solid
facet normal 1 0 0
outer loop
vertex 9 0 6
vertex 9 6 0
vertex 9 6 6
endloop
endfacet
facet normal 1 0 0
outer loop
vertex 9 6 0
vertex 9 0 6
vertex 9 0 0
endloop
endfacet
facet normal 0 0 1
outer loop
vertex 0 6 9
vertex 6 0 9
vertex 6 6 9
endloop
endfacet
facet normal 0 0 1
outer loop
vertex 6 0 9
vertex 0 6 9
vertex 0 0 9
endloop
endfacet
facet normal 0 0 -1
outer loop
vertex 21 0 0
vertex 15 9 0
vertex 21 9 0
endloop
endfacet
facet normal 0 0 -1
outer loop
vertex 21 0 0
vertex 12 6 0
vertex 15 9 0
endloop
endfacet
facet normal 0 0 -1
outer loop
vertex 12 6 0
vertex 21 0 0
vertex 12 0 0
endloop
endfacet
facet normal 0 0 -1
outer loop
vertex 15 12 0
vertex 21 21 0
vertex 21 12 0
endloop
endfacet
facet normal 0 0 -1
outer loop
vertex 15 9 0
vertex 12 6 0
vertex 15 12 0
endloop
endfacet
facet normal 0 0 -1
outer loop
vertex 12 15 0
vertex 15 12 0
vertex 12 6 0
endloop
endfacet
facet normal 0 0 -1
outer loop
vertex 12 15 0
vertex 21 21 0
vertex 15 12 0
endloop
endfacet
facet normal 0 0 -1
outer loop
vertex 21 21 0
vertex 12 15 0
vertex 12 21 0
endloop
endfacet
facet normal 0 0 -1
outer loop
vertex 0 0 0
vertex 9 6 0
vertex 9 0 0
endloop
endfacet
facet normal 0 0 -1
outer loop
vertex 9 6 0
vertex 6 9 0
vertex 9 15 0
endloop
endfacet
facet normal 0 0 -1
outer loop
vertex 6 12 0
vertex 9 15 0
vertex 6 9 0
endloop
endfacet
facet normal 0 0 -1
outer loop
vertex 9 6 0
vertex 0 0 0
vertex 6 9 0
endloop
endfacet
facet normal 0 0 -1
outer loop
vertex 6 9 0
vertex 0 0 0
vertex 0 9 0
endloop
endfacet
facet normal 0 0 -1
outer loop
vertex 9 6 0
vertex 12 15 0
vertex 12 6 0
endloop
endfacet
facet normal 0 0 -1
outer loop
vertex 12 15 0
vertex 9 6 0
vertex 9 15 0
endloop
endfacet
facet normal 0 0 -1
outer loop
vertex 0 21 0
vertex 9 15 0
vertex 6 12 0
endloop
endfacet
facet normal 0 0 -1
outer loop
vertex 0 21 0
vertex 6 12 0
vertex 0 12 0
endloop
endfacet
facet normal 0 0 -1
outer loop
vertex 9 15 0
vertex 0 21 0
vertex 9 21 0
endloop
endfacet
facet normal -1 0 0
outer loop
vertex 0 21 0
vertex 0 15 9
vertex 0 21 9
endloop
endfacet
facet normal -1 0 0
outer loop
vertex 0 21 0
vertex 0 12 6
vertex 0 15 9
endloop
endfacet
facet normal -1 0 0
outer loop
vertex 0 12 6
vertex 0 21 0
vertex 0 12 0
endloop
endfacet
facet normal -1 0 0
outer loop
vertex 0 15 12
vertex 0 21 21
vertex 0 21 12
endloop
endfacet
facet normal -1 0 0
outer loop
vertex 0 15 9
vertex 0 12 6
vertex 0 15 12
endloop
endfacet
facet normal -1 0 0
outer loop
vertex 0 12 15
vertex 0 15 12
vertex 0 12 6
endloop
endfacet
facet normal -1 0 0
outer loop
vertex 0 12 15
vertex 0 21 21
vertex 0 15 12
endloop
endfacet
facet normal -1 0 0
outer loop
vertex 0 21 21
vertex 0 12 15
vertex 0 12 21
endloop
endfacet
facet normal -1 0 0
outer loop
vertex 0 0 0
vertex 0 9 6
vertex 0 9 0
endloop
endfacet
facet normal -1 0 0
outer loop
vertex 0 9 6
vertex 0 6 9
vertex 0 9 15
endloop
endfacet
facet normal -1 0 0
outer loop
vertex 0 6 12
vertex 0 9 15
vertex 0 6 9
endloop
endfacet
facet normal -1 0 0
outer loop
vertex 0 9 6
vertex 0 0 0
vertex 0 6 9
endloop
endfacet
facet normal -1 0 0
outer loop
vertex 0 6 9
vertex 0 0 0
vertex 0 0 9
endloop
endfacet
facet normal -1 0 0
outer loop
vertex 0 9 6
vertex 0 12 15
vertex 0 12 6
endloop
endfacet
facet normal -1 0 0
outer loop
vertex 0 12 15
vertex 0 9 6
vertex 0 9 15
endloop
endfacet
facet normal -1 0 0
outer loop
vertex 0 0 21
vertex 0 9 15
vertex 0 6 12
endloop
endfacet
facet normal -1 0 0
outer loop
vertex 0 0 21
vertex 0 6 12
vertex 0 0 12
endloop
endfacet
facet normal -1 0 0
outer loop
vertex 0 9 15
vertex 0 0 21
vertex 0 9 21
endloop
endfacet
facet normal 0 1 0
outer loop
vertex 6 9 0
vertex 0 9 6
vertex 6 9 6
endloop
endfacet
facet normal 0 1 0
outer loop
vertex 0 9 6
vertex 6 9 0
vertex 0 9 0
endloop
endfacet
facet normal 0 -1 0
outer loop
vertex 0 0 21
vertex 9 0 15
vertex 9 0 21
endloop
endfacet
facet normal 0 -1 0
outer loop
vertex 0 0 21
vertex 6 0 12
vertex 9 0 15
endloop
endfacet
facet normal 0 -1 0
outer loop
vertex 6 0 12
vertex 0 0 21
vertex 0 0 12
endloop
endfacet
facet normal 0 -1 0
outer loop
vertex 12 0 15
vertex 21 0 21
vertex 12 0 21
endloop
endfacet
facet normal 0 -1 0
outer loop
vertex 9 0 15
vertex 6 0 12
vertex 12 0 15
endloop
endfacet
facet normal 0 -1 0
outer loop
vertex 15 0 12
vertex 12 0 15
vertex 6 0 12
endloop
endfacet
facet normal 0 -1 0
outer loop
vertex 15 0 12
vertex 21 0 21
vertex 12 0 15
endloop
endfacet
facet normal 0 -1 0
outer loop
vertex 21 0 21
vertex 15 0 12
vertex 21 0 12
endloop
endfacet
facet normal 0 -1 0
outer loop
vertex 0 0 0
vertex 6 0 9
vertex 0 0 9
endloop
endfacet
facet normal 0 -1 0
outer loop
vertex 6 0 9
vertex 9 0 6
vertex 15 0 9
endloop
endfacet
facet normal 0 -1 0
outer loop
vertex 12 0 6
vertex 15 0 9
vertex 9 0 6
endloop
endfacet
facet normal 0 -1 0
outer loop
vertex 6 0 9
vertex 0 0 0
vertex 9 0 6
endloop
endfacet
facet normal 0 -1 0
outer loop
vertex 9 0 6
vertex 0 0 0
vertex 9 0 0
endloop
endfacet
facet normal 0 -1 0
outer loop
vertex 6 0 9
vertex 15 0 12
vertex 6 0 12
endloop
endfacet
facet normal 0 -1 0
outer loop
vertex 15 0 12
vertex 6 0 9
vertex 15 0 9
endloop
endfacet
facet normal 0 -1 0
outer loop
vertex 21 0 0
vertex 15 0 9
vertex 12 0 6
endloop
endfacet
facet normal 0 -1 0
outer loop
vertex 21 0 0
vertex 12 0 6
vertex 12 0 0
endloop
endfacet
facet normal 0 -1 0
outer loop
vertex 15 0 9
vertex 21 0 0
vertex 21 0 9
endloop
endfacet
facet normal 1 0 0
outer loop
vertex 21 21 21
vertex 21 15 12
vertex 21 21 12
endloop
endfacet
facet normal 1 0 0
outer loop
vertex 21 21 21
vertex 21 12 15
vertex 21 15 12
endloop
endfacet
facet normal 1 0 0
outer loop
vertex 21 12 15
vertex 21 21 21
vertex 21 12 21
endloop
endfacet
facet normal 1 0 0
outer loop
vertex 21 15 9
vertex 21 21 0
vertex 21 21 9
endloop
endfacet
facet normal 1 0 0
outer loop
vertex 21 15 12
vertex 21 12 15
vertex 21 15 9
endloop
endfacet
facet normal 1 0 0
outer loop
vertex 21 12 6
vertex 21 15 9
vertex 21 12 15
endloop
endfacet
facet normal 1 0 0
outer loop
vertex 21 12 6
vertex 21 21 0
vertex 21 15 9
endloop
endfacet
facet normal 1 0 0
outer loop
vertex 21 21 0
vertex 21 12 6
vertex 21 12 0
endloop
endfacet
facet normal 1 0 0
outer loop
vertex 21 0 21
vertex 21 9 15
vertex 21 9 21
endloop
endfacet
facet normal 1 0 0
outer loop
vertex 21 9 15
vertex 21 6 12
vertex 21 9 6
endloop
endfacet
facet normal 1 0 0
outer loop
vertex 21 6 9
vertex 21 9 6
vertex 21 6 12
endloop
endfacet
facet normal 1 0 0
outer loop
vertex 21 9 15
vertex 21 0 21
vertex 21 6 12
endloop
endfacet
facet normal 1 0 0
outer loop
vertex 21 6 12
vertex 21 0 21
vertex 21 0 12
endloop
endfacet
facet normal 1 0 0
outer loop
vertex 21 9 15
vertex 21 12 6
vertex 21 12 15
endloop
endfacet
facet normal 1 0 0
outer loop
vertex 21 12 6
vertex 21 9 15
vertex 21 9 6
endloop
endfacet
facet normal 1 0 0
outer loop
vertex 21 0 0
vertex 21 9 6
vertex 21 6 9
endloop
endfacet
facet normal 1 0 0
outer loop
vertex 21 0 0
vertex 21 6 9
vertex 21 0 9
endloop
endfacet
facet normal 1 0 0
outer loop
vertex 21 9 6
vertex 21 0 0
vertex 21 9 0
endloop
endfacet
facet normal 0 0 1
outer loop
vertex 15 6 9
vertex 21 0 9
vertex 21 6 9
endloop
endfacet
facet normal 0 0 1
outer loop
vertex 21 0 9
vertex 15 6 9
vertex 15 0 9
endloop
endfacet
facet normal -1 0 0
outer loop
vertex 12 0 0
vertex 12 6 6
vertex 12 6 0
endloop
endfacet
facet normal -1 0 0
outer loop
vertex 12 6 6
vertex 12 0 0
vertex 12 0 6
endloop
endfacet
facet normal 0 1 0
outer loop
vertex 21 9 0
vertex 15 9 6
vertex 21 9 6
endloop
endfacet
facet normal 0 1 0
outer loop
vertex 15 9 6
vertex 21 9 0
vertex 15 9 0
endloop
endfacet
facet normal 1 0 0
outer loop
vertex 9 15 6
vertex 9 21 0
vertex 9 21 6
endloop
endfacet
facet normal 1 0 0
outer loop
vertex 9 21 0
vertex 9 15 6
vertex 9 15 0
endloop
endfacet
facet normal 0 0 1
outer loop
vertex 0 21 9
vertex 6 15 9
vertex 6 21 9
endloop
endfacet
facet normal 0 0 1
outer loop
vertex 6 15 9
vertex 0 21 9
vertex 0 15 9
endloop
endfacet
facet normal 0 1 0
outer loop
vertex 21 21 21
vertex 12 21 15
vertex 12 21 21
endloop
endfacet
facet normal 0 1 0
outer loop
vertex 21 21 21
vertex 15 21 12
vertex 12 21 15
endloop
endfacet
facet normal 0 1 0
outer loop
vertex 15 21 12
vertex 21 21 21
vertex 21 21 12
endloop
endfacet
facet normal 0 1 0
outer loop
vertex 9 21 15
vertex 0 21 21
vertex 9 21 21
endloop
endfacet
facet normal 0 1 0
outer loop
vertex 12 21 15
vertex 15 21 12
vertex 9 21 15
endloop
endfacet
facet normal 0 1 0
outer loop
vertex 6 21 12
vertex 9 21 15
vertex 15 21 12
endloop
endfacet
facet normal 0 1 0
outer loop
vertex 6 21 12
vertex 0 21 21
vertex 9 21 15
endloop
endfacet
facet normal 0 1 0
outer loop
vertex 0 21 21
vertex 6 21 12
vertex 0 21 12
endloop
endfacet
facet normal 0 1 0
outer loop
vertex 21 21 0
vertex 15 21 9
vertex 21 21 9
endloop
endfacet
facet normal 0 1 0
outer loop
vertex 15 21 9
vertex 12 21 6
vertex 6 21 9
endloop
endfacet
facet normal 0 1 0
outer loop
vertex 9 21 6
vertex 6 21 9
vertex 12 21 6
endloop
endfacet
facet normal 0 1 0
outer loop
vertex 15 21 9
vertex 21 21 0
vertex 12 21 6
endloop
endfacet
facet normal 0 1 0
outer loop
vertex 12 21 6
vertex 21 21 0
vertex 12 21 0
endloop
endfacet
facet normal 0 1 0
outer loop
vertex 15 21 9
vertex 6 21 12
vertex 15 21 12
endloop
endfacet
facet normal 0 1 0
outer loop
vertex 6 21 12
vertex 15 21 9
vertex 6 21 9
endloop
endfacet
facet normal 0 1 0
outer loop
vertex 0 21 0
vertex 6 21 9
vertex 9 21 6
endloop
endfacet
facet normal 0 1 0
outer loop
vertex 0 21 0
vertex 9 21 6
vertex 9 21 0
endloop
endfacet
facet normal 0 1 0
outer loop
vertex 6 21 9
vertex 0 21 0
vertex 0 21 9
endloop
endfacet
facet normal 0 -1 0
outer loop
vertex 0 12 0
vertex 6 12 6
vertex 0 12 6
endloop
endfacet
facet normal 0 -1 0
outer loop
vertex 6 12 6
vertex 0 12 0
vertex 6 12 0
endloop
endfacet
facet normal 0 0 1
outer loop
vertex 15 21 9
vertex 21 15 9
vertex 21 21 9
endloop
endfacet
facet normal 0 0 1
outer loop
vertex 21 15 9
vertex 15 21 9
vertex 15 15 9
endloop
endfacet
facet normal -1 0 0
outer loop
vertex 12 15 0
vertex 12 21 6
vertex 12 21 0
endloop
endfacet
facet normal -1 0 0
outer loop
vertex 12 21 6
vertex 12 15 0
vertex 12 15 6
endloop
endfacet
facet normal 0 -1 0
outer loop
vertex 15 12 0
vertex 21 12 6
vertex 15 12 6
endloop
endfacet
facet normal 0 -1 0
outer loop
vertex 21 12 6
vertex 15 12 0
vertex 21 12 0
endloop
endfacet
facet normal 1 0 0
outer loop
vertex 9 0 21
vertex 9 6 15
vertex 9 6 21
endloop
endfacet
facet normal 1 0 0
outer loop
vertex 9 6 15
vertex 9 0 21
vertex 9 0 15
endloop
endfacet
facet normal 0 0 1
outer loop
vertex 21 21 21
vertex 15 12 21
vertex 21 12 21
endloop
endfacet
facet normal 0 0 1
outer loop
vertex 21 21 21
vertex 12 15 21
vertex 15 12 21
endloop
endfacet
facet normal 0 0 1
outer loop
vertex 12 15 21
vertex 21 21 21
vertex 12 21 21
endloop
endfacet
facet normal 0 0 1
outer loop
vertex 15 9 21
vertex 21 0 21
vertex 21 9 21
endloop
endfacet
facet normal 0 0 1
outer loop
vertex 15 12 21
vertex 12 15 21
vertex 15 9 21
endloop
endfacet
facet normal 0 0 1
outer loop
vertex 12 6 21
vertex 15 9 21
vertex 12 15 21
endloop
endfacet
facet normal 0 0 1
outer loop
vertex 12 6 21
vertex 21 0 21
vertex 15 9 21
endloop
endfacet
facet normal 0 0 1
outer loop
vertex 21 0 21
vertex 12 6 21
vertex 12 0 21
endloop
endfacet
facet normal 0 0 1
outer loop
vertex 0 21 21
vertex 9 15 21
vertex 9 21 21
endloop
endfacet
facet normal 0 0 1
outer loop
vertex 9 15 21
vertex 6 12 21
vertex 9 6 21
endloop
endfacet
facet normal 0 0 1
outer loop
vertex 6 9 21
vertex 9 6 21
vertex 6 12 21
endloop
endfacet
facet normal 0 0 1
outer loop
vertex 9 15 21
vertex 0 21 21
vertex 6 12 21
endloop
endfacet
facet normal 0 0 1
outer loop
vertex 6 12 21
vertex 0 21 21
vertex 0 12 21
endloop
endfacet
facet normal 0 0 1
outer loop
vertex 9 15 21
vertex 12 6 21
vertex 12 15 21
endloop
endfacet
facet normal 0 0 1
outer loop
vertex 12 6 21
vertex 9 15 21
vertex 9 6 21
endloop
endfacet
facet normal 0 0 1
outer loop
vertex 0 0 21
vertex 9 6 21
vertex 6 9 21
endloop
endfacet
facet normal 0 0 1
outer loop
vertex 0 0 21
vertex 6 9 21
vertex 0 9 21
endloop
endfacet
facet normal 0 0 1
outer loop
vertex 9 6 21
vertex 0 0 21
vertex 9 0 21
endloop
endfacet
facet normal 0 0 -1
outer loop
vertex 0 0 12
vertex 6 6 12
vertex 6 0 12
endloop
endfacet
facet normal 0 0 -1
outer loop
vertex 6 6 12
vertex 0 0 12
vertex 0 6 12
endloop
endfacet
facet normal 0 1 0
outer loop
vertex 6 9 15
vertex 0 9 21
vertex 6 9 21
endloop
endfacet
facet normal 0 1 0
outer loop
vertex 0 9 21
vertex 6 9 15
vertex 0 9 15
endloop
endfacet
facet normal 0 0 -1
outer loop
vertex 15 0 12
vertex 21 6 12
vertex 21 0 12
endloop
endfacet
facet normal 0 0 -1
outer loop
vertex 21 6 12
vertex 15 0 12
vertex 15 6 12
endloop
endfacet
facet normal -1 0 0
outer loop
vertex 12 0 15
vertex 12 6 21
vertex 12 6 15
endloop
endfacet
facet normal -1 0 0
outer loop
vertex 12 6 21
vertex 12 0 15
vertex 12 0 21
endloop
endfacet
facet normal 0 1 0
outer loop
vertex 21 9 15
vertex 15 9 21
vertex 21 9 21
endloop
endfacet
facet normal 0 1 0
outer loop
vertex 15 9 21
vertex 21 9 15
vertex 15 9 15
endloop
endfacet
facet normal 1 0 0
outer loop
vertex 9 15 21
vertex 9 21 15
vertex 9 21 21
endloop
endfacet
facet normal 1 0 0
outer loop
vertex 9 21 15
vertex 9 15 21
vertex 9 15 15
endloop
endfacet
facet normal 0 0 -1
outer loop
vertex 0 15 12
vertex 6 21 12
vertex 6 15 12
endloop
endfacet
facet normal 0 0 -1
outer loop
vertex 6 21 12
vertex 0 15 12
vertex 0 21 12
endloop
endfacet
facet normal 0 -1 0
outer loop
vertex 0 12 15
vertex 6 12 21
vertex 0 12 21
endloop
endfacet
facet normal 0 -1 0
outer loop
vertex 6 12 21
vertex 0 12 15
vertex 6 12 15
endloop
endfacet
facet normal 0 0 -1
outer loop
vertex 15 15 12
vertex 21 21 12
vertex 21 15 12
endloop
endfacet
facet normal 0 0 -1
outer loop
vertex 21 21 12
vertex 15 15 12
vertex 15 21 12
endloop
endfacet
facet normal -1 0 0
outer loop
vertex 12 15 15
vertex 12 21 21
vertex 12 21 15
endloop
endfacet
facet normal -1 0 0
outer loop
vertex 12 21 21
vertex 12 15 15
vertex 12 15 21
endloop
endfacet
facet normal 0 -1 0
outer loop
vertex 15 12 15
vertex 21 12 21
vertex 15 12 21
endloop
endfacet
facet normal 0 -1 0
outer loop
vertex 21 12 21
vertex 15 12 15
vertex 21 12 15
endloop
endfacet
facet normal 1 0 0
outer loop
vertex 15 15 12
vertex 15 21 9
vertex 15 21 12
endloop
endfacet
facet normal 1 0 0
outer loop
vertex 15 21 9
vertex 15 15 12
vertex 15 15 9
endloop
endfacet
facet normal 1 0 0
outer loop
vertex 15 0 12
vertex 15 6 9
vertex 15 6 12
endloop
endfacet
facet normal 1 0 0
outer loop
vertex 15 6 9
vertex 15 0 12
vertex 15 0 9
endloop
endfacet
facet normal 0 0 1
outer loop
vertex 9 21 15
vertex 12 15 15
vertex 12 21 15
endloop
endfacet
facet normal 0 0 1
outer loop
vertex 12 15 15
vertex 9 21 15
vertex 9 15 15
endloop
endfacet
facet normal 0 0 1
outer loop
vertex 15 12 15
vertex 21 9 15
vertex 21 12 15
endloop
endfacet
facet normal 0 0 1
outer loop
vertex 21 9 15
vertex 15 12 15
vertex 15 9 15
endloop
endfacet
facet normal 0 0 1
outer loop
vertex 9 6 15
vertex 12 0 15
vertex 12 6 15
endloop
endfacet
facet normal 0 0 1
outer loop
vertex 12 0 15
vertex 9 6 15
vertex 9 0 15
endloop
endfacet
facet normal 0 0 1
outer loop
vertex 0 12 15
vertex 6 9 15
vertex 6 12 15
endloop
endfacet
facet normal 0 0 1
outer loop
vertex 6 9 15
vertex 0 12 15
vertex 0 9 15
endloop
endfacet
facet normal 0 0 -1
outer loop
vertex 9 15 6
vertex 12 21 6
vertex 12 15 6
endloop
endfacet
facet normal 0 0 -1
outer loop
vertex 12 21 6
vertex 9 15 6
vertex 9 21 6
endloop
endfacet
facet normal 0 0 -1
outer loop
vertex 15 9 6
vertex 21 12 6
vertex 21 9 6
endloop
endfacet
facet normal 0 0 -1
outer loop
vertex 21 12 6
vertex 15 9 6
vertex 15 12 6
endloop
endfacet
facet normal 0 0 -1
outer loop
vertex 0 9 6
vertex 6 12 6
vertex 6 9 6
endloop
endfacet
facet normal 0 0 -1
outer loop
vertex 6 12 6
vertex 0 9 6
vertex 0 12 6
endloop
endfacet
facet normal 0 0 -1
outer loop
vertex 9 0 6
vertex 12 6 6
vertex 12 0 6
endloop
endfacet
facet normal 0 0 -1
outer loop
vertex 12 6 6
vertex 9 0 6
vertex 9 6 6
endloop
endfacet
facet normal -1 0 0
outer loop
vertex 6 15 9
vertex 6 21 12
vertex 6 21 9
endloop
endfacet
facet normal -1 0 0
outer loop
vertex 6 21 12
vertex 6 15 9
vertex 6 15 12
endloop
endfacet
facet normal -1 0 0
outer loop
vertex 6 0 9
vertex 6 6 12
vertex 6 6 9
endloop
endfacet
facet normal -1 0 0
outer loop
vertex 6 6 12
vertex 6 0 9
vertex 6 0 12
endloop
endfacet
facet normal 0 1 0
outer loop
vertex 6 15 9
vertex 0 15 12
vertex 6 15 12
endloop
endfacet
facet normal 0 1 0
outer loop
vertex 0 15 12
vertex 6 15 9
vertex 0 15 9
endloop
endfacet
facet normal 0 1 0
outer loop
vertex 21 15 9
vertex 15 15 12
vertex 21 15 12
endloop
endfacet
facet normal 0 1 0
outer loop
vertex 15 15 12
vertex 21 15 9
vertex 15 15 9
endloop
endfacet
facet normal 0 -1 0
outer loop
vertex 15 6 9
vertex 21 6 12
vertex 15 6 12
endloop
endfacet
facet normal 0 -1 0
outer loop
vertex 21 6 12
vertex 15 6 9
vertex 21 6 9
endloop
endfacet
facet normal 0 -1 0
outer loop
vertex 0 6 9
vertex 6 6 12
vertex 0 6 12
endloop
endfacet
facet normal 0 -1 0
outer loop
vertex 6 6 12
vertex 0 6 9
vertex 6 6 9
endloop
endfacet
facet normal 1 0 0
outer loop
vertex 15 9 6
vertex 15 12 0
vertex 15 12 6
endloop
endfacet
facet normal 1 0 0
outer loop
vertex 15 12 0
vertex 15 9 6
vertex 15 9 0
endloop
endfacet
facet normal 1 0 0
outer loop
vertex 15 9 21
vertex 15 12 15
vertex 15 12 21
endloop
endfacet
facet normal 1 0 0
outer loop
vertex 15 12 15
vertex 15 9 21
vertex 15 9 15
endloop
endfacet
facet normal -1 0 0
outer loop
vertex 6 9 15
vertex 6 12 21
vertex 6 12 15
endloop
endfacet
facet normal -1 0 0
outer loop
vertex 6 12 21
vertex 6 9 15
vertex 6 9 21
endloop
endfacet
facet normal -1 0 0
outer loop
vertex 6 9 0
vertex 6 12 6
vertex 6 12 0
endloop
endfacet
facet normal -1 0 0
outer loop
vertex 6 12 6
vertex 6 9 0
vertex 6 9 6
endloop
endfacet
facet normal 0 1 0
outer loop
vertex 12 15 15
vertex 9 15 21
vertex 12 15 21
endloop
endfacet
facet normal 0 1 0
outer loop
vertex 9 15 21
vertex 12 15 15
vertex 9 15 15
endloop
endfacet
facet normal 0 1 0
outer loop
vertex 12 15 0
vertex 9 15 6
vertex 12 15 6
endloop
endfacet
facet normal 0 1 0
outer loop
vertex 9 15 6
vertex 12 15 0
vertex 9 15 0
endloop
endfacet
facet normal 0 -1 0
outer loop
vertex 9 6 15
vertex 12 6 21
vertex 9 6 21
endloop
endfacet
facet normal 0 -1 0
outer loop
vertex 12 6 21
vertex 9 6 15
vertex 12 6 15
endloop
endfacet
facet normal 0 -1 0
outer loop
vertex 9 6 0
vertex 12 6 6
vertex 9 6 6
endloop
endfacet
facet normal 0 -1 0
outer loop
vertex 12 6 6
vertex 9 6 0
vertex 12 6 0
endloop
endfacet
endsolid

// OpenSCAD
spazio=3; // [1:7]
lato=9; // [9:20]
gap=spazio+lato;
lcube=[lato,lato,lato];


translate([0,0,0]){
	cube(lcube);
	}

translate([gap,0,0]){
	cube(lcube);
	}		

translate([0,gap,0]){
	cube(lcube);
	}	
translate([gap,gap,0]){
	cube(lcube);
	}		
translate([0,0,gap]){
	cube(lcube);
	}

translate([gap,0,gap]){
	cube(lcube);
	}		

translate([0,gap,gap]){
	cube(lcube);
	}	
translate([gap,gap,gap]){
	cube(lcube);
	}		
translate([gap/2,0,gap/2]){
	cube([lato,((lato*2)+spazio),lato]);
	}		
translate([0,gap/2,gap/2]){
cube([((lato*2)+spazio),lato,lato]);
	}		
translate([(gap/2),(gap/2),0]){
cube([lato,lato,((lato*2)+spazio)]);
	}	


